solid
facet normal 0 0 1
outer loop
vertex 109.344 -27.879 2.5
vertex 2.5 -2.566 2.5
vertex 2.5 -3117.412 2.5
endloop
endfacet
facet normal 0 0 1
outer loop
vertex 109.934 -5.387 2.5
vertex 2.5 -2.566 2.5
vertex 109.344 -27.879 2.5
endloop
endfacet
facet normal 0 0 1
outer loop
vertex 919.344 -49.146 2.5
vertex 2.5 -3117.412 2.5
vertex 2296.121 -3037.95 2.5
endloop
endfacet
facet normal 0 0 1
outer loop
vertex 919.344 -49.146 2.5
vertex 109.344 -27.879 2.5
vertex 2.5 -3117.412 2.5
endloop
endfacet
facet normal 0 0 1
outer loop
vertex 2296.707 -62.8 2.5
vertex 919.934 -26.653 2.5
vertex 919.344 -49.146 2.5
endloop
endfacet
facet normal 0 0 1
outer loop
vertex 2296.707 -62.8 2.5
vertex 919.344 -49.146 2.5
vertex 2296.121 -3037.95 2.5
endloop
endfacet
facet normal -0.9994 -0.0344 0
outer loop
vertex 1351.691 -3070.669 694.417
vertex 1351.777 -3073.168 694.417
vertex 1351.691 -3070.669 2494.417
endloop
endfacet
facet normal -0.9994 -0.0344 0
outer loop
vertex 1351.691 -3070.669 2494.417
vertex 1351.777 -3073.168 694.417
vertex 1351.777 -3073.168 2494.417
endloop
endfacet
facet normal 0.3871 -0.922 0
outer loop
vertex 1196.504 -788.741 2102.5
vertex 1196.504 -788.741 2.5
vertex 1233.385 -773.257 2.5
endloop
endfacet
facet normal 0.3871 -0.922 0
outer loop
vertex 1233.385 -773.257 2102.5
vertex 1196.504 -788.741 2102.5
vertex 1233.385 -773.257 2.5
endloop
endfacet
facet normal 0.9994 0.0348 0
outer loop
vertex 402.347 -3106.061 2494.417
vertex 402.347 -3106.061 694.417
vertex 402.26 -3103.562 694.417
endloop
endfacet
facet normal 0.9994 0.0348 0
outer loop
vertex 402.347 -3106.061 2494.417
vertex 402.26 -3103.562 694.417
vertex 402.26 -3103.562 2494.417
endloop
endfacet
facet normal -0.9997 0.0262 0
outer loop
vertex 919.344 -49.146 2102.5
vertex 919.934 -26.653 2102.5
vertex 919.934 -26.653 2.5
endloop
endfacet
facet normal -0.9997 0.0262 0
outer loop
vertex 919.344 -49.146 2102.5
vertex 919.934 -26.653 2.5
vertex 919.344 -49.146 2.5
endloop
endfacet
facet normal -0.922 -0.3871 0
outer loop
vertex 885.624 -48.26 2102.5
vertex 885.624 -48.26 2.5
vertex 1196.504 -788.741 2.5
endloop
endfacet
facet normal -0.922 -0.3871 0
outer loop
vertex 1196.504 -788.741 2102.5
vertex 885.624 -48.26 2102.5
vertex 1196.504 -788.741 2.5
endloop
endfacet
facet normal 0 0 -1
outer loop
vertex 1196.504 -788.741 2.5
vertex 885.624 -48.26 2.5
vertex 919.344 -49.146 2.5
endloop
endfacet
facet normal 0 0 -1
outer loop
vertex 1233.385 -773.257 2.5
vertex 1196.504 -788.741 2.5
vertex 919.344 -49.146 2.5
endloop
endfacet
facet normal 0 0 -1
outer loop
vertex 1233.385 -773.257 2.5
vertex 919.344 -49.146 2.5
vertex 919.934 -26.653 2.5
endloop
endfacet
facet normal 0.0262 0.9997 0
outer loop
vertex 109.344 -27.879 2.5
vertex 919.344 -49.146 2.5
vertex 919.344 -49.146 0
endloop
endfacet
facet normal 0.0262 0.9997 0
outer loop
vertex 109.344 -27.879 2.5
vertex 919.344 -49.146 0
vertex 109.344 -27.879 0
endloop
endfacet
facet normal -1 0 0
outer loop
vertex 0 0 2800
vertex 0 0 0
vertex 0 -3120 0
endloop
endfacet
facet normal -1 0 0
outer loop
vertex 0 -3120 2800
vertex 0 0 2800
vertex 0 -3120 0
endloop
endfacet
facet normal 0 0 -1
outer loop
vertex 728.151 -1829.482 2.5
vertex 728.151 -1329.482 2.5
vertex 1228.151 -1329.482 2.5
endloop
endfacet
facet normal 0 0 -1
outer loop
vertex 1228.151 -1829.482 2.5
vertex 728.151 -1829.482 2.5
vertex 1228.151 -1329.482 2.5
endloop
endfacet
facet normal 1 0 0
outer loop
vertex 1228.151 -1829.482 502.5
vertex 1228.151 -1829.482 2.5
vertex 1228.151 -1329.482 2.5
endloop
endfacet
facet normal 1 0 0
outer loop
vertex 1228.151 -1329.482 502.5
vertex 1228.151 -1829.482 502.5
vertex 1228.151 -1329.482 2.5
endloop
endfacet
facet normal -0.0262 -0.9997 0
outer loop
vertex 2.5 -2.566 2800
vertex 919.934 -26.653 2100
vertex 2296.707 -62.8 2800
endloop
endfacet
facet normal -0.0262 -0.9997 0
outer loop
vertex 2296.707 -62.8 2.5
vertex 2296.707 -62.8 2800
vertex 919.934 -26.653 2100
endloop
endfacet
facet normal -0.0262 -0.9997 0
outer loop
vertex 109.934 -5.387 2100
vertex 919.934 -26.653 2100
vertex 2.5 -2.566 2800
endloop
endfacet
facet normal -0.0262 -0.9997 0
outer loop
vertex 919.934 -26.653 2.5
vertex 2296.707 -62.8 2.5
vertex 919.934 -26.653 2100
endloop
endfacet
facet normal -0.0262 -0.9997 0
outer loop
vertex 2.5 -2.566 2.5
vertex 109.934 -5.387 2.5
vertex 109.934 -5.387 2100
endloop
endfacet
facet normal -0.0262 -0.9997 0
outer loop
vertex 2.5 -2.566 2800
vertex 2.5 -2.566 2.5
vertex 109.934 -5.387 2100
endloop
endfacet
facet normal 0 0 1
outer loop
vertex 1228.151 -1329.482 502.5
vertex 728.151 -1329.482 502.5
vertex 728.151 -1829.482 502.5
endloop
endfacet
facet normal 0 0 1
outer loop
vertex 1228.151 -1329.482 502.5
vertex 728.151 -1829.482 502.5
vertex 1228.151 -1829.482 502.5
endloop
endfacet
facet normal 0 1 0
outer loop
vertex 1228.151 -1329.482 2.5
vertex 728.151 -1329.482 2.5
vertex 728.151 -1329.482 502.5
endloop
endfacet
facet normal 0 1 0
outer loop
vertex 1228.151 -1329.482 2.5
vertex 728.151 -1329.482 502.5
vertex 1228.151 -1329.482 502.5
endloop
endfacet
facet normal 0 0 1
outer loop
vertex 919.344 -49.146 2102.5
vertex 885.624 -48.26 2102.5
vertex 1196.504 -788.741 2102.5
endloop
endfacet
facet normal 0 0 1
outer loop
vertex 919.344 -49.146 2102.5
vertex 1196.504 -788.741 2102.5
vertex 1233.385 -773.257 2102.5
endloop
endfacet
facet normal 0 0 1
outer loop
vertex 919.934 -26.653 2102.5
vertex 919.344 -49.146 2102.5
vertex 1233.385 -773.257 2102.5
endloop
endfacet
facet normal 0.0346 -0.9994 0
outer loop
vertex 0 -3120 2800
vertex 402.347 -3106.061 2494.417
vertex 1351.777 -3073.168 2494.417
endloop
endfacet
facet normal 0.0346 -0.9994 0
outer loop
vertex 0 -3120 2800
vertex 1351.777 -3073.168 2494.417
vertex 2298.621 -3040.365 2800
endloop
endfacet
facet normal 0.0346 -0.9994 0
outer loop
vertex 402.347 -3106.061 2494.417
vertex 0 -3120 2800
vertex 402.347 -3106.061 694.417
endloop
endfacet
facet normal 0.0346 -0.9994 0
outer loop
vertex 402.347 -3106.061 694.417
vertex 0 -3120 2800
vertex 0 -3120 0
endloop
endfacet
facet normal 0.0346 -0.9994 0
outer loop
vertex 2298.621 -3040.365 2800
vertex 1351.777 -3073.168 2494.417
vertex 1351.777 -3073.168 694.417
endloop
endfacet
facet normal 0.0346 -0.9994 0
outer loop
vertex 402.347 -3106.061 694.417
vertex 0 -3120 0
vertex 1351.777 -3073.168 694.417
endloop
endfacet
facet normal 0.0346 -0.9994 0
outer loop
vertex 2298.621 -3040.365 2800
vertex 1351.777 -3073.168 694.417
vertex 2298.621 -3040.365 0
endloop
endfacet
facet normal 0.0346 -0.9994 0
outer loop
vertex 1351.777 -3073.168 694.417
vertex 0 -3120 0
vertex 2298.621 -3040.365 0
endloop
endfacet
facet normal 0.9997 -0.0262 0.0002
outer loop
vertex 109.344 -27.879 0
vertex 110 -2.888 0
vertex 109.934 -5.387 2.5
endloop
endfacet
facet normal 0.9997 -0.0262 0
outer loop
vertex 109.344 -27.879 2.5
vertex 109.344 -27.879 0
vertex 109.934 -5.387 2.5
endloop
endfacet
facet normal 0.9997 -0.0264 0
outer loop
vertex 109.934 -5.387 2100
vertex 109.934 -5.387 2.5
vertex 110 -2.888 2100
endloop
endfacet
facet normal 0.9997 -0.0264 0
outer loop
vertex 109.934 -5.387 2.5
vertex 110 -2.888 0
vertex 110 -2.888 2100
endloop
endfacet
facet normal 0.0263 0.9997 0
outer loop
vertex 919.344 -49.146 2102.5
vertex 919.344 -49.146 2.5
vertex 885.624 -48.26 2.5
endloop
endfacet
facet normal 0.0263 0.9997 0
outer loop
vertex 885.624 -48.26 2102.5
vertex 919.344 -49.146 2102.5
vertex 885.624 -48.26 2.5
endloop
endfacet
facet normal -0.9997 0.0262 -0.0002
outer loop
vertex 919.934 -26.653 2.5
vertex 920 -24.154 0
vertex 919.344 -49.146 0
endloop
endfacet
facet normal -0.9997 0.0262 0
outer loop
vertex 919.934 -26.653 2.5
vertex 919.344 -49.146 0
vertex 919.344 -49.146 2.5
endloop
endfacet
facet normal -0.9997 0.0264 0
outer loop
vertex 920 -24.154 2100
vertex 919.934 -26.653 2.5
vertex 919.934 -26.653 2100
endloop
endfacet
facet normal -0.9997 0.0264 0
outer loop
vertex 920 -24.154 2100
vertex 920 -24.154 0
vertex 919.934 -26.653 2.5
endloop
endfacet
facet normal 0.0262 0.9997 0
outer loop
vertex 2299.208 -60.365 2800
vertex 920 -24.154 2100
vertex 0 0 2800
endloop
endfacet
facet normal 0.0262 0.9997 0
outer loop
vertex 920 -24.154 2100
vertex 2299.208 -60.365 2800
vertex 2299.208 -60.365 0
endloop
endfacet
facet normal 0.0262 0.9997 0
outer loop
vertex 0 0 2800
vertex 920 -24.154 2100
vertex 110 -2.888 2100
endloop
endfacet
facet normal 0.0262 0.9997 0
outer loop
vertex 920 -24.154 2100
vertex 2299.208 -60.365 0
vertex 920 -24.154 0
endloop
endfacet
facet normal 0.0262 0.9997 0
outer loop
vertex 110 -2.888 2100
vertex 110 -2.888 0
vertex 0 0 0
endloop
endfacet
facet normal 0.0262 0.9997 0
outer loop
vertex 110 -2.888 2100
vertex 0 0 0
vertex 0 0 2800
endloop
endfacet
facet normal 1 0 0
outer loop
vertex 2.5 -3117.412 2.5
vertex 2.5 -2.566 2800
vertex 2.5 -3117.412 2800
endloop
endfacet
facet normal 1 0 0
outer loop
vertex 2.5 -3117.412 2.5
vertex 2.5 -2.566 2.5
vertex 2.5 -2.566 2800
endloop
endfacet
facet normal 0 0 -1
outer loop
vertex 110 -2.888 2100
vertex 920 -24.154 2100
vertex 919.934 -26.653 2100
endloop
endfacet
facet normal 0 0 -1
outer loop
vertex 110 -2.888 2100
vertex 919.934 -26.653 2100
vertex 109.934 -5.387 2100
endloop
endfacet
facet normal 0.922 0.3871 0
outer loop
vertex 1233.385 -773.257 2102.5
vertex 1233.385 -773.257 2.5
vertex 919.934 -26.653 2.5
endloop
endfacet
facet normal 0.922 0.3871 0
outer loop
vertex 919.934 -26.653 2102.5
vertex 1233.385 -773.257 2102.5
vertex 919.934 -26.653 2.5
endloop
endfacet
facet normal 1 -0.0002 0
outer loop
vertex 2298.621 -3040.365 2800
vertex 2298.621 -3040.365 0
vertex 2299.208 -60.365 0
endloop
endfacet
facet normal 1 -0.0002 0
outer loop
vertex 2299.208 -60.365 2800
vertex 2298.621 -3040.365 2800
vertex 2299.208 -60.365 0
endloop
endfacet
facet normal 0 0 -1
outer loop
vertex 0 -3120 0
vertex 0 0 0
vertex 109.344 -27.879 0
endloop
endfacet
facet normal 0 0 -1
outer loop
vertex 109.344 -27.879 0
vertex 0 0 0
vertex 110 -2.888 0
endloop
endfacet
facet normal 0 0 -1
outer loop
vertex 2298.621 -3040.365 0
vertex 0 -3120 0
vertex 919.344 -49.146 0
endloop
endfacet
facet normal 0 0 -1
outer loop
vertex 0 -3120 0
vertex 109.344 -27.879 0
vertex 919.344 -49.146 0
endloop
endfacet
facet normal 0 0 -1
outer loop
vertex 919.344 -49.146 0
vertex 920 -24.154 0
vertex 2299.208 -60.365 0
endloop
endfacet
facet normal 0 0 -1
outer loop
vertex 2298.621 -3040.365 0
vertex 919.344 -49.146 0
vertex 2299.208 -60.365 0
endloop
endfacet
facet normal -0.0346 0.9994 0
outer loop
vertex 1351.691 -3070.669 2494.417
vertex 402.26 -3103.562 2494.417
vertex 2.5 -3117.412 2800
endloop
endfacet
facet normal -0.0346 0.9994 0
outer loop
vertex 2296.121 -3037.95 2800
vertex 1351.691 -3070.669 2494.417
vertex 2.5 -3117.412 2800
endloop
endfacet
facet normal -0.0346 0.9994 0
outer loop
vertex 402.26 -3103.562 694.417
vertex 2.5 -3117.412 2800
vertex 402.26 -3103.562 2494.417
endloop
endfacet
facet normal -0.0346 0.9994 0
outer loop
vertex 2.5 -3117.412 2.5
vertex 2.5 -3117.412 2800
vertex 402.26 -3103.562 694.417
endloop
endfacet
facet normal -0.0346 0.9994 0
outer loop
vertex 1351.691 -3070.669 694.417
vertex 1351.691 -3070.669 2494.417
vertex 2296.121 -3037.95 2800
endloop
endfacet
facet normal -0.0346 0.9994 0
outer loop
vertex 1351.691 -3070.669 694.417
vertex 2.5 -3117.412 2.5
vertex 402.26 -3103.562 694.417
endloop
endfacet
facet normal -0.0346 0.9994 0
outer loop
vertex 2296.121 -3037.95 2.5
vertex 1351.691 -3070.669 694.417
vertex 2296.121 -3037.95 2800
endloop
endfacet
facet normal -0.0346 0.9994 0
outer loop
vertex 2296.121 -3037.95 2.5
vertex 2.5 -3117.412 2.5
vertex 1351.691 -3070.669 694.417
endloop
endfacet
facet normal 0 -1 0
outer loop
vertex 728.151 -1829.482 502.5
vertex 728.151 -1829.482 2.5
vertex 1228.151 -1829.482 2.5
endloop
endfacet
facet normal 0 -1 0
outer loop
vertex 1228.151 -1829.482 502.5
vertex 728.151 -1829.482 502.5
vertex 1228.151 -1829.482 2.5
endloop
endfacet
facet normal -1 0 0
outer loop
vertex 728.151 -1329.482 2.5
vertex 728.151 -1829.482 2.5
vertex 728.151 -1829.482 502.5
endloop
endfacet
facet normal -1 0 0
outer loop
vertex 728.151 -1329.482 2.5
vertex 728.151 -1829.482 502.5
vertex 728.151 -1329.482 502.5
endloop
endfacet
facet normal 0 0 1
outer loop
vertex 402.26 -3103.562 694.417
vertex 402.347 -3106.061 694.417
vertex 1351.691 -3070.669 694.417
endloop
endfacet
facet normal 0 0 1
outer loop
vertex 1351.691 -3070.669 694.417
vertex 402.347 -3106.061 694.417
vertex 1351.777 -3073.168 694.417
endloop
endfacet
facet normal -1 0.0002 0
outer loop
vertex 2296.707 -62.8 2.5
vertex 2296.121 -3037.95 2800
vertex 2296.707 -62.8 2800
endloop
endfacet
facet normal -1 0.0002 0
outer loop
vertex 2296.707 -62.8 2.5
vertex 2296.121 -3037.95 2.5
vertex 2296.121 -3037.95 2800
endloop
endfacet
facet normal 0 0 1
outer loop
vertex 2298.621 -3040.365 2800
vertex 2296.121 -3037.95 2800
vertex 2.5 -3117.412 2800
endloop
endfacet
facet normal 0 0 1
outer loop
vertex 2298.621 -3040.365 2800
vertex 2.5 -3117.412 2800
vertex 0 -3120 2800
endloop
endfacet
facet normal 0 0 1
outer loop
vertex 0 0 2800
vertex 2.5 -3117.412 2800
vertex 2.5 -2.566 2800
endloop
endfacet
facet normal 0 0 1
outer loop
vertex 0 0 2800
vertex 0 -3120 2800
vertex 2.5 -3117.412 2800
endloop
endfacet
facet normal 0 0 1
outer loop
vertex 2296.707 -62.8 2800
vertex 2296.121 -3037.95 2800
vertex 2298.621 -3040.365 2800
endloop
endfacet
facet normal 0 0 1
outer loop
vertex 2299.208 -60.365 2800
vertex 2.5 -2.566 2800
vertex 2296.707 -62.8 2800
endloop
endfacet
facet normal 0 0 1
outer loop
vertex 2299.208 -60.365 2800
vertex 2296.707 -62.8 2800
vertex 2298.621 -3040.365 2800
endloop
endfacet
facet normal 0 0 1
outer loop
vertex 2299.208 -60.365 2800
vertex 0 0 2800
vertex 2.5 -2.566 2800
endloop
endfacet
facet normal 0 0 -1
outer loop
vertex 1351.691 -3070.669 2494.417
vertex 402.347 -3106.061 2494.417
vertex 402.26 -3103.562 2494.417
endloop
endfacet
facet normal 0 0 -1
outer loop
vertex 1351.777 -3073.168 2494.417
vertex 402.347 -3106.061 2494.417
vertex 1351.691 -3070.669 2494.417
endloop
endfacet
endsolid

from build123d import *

# Parameters (mm, degrees)
F1_DEPTH  = 2800
F3_T      = -2.5
F2_W      = 810.2791197664
F2_H      = 2100
F4_DEPTH  = 25
F5_W      = 950
F5_H      = 1800
F6_DEPTH  = 25
F8_DEPTH  = 2100
F9_W      = 500
F9_H      = 500
F10_DEPTH = 500


with BuildPart() as f1:
    # F0 (on Top) → F1 (new body)
    with BuildSketch(Plane.XY):
        with BuildLine():
            Line((0, 0), (0, -3120))
            Line((0, -3120), (2298.6209382309, -3040.3646917089))
            Line((2298.6209382309, -3040.3646917089), (2299.207710717, -60.3647494777))
            Line((2299.207710717, -60.3647494777), (979.207710717, -25.70869429))
            Line((979.207710717, -25.70869429), (920, -24.1542202823))
            Line((920, -24.1542202823), (920, -834.4333400488))
            ThreePointArc((920, -834.4333400488), (339.5760935083, -589.5393462827), (110, -2.888004599))
            Line((110, -2.888004599), (0, 0))
        make_face()
        with BuildLine():
            Line((920, -24.1542202823), (110, -2.888004599))
            ThreePointArc((110, -2.888004599), (339.5760935083, -589.5393462827), (920, -834.4333400488))
            Line((920, -834.4333400488), (920, -24.1542202823))
        make_face()
    extrude(amount=F1_DEPTH)

    # F3
    f3_openings = [f1.faces().sort_by_distance(p)[0] for p in [
        (1140.663346, -1555.152855, 2800),
    ]]
    offset(amount=F3_T, openings=f3_openings)

    # F2 (on face) → F4 (cut)
    with BuildSketch(Plane(origin=(0, 0, 0), x_dir=(-0.9996555264, 0.0262455433, 0), z_dir=(0.0262455433, 0.9996555264, 0))):
        with Locations((-515.1774650367, 1050)):
            Rectangle(F2_W, F2_H)
    extrude(amount=-F4_DEPTH, mode=Mode.SUBTRACT)

    # F5 (on face) → F6 (cut)
    with BuildSketch(Plane(origin=(107.9622547502, -3116.2596671344, 0), x_dir=(0.9994004079, 0.0346240471, 0), z_dir=(0.0346240471, -0.9994004079, 0))):
        with Locations((769.5610850299, 1594.4172442177)):
            Rectangle(F5_W, F5_H)
    extrude(amount=-F6_DEPTH, mode=Mode.SUBTRACT)


with BuildPart() as f8:
    # F7 (on face) → F8 (new body)
    with BuildSketch(Plane.XY.offset(2.5)):
        Polygon((1233.385013391, -773.2569011416), (919.9343861419, -26.6533590983), (919.3438614187, -49.1456084423), (885.623501836, -48.2602943191), (1196.5035627008, -788.7410412531), align=None)
    extrude(amount=F8_DEPTH)


with BuildPart() as f10:
    # F9 (on face) → F10 (new body)
    with BuildSketch(Plane.XY.offset(2.5)):
        with Locations((978.150844574, -1579.4820951094)):
            Rectangle(F9_W, F9_H)
    extrude(amount=F10_DEPTH)


solid = Compound([f1.part, f8.part, f10.part])
